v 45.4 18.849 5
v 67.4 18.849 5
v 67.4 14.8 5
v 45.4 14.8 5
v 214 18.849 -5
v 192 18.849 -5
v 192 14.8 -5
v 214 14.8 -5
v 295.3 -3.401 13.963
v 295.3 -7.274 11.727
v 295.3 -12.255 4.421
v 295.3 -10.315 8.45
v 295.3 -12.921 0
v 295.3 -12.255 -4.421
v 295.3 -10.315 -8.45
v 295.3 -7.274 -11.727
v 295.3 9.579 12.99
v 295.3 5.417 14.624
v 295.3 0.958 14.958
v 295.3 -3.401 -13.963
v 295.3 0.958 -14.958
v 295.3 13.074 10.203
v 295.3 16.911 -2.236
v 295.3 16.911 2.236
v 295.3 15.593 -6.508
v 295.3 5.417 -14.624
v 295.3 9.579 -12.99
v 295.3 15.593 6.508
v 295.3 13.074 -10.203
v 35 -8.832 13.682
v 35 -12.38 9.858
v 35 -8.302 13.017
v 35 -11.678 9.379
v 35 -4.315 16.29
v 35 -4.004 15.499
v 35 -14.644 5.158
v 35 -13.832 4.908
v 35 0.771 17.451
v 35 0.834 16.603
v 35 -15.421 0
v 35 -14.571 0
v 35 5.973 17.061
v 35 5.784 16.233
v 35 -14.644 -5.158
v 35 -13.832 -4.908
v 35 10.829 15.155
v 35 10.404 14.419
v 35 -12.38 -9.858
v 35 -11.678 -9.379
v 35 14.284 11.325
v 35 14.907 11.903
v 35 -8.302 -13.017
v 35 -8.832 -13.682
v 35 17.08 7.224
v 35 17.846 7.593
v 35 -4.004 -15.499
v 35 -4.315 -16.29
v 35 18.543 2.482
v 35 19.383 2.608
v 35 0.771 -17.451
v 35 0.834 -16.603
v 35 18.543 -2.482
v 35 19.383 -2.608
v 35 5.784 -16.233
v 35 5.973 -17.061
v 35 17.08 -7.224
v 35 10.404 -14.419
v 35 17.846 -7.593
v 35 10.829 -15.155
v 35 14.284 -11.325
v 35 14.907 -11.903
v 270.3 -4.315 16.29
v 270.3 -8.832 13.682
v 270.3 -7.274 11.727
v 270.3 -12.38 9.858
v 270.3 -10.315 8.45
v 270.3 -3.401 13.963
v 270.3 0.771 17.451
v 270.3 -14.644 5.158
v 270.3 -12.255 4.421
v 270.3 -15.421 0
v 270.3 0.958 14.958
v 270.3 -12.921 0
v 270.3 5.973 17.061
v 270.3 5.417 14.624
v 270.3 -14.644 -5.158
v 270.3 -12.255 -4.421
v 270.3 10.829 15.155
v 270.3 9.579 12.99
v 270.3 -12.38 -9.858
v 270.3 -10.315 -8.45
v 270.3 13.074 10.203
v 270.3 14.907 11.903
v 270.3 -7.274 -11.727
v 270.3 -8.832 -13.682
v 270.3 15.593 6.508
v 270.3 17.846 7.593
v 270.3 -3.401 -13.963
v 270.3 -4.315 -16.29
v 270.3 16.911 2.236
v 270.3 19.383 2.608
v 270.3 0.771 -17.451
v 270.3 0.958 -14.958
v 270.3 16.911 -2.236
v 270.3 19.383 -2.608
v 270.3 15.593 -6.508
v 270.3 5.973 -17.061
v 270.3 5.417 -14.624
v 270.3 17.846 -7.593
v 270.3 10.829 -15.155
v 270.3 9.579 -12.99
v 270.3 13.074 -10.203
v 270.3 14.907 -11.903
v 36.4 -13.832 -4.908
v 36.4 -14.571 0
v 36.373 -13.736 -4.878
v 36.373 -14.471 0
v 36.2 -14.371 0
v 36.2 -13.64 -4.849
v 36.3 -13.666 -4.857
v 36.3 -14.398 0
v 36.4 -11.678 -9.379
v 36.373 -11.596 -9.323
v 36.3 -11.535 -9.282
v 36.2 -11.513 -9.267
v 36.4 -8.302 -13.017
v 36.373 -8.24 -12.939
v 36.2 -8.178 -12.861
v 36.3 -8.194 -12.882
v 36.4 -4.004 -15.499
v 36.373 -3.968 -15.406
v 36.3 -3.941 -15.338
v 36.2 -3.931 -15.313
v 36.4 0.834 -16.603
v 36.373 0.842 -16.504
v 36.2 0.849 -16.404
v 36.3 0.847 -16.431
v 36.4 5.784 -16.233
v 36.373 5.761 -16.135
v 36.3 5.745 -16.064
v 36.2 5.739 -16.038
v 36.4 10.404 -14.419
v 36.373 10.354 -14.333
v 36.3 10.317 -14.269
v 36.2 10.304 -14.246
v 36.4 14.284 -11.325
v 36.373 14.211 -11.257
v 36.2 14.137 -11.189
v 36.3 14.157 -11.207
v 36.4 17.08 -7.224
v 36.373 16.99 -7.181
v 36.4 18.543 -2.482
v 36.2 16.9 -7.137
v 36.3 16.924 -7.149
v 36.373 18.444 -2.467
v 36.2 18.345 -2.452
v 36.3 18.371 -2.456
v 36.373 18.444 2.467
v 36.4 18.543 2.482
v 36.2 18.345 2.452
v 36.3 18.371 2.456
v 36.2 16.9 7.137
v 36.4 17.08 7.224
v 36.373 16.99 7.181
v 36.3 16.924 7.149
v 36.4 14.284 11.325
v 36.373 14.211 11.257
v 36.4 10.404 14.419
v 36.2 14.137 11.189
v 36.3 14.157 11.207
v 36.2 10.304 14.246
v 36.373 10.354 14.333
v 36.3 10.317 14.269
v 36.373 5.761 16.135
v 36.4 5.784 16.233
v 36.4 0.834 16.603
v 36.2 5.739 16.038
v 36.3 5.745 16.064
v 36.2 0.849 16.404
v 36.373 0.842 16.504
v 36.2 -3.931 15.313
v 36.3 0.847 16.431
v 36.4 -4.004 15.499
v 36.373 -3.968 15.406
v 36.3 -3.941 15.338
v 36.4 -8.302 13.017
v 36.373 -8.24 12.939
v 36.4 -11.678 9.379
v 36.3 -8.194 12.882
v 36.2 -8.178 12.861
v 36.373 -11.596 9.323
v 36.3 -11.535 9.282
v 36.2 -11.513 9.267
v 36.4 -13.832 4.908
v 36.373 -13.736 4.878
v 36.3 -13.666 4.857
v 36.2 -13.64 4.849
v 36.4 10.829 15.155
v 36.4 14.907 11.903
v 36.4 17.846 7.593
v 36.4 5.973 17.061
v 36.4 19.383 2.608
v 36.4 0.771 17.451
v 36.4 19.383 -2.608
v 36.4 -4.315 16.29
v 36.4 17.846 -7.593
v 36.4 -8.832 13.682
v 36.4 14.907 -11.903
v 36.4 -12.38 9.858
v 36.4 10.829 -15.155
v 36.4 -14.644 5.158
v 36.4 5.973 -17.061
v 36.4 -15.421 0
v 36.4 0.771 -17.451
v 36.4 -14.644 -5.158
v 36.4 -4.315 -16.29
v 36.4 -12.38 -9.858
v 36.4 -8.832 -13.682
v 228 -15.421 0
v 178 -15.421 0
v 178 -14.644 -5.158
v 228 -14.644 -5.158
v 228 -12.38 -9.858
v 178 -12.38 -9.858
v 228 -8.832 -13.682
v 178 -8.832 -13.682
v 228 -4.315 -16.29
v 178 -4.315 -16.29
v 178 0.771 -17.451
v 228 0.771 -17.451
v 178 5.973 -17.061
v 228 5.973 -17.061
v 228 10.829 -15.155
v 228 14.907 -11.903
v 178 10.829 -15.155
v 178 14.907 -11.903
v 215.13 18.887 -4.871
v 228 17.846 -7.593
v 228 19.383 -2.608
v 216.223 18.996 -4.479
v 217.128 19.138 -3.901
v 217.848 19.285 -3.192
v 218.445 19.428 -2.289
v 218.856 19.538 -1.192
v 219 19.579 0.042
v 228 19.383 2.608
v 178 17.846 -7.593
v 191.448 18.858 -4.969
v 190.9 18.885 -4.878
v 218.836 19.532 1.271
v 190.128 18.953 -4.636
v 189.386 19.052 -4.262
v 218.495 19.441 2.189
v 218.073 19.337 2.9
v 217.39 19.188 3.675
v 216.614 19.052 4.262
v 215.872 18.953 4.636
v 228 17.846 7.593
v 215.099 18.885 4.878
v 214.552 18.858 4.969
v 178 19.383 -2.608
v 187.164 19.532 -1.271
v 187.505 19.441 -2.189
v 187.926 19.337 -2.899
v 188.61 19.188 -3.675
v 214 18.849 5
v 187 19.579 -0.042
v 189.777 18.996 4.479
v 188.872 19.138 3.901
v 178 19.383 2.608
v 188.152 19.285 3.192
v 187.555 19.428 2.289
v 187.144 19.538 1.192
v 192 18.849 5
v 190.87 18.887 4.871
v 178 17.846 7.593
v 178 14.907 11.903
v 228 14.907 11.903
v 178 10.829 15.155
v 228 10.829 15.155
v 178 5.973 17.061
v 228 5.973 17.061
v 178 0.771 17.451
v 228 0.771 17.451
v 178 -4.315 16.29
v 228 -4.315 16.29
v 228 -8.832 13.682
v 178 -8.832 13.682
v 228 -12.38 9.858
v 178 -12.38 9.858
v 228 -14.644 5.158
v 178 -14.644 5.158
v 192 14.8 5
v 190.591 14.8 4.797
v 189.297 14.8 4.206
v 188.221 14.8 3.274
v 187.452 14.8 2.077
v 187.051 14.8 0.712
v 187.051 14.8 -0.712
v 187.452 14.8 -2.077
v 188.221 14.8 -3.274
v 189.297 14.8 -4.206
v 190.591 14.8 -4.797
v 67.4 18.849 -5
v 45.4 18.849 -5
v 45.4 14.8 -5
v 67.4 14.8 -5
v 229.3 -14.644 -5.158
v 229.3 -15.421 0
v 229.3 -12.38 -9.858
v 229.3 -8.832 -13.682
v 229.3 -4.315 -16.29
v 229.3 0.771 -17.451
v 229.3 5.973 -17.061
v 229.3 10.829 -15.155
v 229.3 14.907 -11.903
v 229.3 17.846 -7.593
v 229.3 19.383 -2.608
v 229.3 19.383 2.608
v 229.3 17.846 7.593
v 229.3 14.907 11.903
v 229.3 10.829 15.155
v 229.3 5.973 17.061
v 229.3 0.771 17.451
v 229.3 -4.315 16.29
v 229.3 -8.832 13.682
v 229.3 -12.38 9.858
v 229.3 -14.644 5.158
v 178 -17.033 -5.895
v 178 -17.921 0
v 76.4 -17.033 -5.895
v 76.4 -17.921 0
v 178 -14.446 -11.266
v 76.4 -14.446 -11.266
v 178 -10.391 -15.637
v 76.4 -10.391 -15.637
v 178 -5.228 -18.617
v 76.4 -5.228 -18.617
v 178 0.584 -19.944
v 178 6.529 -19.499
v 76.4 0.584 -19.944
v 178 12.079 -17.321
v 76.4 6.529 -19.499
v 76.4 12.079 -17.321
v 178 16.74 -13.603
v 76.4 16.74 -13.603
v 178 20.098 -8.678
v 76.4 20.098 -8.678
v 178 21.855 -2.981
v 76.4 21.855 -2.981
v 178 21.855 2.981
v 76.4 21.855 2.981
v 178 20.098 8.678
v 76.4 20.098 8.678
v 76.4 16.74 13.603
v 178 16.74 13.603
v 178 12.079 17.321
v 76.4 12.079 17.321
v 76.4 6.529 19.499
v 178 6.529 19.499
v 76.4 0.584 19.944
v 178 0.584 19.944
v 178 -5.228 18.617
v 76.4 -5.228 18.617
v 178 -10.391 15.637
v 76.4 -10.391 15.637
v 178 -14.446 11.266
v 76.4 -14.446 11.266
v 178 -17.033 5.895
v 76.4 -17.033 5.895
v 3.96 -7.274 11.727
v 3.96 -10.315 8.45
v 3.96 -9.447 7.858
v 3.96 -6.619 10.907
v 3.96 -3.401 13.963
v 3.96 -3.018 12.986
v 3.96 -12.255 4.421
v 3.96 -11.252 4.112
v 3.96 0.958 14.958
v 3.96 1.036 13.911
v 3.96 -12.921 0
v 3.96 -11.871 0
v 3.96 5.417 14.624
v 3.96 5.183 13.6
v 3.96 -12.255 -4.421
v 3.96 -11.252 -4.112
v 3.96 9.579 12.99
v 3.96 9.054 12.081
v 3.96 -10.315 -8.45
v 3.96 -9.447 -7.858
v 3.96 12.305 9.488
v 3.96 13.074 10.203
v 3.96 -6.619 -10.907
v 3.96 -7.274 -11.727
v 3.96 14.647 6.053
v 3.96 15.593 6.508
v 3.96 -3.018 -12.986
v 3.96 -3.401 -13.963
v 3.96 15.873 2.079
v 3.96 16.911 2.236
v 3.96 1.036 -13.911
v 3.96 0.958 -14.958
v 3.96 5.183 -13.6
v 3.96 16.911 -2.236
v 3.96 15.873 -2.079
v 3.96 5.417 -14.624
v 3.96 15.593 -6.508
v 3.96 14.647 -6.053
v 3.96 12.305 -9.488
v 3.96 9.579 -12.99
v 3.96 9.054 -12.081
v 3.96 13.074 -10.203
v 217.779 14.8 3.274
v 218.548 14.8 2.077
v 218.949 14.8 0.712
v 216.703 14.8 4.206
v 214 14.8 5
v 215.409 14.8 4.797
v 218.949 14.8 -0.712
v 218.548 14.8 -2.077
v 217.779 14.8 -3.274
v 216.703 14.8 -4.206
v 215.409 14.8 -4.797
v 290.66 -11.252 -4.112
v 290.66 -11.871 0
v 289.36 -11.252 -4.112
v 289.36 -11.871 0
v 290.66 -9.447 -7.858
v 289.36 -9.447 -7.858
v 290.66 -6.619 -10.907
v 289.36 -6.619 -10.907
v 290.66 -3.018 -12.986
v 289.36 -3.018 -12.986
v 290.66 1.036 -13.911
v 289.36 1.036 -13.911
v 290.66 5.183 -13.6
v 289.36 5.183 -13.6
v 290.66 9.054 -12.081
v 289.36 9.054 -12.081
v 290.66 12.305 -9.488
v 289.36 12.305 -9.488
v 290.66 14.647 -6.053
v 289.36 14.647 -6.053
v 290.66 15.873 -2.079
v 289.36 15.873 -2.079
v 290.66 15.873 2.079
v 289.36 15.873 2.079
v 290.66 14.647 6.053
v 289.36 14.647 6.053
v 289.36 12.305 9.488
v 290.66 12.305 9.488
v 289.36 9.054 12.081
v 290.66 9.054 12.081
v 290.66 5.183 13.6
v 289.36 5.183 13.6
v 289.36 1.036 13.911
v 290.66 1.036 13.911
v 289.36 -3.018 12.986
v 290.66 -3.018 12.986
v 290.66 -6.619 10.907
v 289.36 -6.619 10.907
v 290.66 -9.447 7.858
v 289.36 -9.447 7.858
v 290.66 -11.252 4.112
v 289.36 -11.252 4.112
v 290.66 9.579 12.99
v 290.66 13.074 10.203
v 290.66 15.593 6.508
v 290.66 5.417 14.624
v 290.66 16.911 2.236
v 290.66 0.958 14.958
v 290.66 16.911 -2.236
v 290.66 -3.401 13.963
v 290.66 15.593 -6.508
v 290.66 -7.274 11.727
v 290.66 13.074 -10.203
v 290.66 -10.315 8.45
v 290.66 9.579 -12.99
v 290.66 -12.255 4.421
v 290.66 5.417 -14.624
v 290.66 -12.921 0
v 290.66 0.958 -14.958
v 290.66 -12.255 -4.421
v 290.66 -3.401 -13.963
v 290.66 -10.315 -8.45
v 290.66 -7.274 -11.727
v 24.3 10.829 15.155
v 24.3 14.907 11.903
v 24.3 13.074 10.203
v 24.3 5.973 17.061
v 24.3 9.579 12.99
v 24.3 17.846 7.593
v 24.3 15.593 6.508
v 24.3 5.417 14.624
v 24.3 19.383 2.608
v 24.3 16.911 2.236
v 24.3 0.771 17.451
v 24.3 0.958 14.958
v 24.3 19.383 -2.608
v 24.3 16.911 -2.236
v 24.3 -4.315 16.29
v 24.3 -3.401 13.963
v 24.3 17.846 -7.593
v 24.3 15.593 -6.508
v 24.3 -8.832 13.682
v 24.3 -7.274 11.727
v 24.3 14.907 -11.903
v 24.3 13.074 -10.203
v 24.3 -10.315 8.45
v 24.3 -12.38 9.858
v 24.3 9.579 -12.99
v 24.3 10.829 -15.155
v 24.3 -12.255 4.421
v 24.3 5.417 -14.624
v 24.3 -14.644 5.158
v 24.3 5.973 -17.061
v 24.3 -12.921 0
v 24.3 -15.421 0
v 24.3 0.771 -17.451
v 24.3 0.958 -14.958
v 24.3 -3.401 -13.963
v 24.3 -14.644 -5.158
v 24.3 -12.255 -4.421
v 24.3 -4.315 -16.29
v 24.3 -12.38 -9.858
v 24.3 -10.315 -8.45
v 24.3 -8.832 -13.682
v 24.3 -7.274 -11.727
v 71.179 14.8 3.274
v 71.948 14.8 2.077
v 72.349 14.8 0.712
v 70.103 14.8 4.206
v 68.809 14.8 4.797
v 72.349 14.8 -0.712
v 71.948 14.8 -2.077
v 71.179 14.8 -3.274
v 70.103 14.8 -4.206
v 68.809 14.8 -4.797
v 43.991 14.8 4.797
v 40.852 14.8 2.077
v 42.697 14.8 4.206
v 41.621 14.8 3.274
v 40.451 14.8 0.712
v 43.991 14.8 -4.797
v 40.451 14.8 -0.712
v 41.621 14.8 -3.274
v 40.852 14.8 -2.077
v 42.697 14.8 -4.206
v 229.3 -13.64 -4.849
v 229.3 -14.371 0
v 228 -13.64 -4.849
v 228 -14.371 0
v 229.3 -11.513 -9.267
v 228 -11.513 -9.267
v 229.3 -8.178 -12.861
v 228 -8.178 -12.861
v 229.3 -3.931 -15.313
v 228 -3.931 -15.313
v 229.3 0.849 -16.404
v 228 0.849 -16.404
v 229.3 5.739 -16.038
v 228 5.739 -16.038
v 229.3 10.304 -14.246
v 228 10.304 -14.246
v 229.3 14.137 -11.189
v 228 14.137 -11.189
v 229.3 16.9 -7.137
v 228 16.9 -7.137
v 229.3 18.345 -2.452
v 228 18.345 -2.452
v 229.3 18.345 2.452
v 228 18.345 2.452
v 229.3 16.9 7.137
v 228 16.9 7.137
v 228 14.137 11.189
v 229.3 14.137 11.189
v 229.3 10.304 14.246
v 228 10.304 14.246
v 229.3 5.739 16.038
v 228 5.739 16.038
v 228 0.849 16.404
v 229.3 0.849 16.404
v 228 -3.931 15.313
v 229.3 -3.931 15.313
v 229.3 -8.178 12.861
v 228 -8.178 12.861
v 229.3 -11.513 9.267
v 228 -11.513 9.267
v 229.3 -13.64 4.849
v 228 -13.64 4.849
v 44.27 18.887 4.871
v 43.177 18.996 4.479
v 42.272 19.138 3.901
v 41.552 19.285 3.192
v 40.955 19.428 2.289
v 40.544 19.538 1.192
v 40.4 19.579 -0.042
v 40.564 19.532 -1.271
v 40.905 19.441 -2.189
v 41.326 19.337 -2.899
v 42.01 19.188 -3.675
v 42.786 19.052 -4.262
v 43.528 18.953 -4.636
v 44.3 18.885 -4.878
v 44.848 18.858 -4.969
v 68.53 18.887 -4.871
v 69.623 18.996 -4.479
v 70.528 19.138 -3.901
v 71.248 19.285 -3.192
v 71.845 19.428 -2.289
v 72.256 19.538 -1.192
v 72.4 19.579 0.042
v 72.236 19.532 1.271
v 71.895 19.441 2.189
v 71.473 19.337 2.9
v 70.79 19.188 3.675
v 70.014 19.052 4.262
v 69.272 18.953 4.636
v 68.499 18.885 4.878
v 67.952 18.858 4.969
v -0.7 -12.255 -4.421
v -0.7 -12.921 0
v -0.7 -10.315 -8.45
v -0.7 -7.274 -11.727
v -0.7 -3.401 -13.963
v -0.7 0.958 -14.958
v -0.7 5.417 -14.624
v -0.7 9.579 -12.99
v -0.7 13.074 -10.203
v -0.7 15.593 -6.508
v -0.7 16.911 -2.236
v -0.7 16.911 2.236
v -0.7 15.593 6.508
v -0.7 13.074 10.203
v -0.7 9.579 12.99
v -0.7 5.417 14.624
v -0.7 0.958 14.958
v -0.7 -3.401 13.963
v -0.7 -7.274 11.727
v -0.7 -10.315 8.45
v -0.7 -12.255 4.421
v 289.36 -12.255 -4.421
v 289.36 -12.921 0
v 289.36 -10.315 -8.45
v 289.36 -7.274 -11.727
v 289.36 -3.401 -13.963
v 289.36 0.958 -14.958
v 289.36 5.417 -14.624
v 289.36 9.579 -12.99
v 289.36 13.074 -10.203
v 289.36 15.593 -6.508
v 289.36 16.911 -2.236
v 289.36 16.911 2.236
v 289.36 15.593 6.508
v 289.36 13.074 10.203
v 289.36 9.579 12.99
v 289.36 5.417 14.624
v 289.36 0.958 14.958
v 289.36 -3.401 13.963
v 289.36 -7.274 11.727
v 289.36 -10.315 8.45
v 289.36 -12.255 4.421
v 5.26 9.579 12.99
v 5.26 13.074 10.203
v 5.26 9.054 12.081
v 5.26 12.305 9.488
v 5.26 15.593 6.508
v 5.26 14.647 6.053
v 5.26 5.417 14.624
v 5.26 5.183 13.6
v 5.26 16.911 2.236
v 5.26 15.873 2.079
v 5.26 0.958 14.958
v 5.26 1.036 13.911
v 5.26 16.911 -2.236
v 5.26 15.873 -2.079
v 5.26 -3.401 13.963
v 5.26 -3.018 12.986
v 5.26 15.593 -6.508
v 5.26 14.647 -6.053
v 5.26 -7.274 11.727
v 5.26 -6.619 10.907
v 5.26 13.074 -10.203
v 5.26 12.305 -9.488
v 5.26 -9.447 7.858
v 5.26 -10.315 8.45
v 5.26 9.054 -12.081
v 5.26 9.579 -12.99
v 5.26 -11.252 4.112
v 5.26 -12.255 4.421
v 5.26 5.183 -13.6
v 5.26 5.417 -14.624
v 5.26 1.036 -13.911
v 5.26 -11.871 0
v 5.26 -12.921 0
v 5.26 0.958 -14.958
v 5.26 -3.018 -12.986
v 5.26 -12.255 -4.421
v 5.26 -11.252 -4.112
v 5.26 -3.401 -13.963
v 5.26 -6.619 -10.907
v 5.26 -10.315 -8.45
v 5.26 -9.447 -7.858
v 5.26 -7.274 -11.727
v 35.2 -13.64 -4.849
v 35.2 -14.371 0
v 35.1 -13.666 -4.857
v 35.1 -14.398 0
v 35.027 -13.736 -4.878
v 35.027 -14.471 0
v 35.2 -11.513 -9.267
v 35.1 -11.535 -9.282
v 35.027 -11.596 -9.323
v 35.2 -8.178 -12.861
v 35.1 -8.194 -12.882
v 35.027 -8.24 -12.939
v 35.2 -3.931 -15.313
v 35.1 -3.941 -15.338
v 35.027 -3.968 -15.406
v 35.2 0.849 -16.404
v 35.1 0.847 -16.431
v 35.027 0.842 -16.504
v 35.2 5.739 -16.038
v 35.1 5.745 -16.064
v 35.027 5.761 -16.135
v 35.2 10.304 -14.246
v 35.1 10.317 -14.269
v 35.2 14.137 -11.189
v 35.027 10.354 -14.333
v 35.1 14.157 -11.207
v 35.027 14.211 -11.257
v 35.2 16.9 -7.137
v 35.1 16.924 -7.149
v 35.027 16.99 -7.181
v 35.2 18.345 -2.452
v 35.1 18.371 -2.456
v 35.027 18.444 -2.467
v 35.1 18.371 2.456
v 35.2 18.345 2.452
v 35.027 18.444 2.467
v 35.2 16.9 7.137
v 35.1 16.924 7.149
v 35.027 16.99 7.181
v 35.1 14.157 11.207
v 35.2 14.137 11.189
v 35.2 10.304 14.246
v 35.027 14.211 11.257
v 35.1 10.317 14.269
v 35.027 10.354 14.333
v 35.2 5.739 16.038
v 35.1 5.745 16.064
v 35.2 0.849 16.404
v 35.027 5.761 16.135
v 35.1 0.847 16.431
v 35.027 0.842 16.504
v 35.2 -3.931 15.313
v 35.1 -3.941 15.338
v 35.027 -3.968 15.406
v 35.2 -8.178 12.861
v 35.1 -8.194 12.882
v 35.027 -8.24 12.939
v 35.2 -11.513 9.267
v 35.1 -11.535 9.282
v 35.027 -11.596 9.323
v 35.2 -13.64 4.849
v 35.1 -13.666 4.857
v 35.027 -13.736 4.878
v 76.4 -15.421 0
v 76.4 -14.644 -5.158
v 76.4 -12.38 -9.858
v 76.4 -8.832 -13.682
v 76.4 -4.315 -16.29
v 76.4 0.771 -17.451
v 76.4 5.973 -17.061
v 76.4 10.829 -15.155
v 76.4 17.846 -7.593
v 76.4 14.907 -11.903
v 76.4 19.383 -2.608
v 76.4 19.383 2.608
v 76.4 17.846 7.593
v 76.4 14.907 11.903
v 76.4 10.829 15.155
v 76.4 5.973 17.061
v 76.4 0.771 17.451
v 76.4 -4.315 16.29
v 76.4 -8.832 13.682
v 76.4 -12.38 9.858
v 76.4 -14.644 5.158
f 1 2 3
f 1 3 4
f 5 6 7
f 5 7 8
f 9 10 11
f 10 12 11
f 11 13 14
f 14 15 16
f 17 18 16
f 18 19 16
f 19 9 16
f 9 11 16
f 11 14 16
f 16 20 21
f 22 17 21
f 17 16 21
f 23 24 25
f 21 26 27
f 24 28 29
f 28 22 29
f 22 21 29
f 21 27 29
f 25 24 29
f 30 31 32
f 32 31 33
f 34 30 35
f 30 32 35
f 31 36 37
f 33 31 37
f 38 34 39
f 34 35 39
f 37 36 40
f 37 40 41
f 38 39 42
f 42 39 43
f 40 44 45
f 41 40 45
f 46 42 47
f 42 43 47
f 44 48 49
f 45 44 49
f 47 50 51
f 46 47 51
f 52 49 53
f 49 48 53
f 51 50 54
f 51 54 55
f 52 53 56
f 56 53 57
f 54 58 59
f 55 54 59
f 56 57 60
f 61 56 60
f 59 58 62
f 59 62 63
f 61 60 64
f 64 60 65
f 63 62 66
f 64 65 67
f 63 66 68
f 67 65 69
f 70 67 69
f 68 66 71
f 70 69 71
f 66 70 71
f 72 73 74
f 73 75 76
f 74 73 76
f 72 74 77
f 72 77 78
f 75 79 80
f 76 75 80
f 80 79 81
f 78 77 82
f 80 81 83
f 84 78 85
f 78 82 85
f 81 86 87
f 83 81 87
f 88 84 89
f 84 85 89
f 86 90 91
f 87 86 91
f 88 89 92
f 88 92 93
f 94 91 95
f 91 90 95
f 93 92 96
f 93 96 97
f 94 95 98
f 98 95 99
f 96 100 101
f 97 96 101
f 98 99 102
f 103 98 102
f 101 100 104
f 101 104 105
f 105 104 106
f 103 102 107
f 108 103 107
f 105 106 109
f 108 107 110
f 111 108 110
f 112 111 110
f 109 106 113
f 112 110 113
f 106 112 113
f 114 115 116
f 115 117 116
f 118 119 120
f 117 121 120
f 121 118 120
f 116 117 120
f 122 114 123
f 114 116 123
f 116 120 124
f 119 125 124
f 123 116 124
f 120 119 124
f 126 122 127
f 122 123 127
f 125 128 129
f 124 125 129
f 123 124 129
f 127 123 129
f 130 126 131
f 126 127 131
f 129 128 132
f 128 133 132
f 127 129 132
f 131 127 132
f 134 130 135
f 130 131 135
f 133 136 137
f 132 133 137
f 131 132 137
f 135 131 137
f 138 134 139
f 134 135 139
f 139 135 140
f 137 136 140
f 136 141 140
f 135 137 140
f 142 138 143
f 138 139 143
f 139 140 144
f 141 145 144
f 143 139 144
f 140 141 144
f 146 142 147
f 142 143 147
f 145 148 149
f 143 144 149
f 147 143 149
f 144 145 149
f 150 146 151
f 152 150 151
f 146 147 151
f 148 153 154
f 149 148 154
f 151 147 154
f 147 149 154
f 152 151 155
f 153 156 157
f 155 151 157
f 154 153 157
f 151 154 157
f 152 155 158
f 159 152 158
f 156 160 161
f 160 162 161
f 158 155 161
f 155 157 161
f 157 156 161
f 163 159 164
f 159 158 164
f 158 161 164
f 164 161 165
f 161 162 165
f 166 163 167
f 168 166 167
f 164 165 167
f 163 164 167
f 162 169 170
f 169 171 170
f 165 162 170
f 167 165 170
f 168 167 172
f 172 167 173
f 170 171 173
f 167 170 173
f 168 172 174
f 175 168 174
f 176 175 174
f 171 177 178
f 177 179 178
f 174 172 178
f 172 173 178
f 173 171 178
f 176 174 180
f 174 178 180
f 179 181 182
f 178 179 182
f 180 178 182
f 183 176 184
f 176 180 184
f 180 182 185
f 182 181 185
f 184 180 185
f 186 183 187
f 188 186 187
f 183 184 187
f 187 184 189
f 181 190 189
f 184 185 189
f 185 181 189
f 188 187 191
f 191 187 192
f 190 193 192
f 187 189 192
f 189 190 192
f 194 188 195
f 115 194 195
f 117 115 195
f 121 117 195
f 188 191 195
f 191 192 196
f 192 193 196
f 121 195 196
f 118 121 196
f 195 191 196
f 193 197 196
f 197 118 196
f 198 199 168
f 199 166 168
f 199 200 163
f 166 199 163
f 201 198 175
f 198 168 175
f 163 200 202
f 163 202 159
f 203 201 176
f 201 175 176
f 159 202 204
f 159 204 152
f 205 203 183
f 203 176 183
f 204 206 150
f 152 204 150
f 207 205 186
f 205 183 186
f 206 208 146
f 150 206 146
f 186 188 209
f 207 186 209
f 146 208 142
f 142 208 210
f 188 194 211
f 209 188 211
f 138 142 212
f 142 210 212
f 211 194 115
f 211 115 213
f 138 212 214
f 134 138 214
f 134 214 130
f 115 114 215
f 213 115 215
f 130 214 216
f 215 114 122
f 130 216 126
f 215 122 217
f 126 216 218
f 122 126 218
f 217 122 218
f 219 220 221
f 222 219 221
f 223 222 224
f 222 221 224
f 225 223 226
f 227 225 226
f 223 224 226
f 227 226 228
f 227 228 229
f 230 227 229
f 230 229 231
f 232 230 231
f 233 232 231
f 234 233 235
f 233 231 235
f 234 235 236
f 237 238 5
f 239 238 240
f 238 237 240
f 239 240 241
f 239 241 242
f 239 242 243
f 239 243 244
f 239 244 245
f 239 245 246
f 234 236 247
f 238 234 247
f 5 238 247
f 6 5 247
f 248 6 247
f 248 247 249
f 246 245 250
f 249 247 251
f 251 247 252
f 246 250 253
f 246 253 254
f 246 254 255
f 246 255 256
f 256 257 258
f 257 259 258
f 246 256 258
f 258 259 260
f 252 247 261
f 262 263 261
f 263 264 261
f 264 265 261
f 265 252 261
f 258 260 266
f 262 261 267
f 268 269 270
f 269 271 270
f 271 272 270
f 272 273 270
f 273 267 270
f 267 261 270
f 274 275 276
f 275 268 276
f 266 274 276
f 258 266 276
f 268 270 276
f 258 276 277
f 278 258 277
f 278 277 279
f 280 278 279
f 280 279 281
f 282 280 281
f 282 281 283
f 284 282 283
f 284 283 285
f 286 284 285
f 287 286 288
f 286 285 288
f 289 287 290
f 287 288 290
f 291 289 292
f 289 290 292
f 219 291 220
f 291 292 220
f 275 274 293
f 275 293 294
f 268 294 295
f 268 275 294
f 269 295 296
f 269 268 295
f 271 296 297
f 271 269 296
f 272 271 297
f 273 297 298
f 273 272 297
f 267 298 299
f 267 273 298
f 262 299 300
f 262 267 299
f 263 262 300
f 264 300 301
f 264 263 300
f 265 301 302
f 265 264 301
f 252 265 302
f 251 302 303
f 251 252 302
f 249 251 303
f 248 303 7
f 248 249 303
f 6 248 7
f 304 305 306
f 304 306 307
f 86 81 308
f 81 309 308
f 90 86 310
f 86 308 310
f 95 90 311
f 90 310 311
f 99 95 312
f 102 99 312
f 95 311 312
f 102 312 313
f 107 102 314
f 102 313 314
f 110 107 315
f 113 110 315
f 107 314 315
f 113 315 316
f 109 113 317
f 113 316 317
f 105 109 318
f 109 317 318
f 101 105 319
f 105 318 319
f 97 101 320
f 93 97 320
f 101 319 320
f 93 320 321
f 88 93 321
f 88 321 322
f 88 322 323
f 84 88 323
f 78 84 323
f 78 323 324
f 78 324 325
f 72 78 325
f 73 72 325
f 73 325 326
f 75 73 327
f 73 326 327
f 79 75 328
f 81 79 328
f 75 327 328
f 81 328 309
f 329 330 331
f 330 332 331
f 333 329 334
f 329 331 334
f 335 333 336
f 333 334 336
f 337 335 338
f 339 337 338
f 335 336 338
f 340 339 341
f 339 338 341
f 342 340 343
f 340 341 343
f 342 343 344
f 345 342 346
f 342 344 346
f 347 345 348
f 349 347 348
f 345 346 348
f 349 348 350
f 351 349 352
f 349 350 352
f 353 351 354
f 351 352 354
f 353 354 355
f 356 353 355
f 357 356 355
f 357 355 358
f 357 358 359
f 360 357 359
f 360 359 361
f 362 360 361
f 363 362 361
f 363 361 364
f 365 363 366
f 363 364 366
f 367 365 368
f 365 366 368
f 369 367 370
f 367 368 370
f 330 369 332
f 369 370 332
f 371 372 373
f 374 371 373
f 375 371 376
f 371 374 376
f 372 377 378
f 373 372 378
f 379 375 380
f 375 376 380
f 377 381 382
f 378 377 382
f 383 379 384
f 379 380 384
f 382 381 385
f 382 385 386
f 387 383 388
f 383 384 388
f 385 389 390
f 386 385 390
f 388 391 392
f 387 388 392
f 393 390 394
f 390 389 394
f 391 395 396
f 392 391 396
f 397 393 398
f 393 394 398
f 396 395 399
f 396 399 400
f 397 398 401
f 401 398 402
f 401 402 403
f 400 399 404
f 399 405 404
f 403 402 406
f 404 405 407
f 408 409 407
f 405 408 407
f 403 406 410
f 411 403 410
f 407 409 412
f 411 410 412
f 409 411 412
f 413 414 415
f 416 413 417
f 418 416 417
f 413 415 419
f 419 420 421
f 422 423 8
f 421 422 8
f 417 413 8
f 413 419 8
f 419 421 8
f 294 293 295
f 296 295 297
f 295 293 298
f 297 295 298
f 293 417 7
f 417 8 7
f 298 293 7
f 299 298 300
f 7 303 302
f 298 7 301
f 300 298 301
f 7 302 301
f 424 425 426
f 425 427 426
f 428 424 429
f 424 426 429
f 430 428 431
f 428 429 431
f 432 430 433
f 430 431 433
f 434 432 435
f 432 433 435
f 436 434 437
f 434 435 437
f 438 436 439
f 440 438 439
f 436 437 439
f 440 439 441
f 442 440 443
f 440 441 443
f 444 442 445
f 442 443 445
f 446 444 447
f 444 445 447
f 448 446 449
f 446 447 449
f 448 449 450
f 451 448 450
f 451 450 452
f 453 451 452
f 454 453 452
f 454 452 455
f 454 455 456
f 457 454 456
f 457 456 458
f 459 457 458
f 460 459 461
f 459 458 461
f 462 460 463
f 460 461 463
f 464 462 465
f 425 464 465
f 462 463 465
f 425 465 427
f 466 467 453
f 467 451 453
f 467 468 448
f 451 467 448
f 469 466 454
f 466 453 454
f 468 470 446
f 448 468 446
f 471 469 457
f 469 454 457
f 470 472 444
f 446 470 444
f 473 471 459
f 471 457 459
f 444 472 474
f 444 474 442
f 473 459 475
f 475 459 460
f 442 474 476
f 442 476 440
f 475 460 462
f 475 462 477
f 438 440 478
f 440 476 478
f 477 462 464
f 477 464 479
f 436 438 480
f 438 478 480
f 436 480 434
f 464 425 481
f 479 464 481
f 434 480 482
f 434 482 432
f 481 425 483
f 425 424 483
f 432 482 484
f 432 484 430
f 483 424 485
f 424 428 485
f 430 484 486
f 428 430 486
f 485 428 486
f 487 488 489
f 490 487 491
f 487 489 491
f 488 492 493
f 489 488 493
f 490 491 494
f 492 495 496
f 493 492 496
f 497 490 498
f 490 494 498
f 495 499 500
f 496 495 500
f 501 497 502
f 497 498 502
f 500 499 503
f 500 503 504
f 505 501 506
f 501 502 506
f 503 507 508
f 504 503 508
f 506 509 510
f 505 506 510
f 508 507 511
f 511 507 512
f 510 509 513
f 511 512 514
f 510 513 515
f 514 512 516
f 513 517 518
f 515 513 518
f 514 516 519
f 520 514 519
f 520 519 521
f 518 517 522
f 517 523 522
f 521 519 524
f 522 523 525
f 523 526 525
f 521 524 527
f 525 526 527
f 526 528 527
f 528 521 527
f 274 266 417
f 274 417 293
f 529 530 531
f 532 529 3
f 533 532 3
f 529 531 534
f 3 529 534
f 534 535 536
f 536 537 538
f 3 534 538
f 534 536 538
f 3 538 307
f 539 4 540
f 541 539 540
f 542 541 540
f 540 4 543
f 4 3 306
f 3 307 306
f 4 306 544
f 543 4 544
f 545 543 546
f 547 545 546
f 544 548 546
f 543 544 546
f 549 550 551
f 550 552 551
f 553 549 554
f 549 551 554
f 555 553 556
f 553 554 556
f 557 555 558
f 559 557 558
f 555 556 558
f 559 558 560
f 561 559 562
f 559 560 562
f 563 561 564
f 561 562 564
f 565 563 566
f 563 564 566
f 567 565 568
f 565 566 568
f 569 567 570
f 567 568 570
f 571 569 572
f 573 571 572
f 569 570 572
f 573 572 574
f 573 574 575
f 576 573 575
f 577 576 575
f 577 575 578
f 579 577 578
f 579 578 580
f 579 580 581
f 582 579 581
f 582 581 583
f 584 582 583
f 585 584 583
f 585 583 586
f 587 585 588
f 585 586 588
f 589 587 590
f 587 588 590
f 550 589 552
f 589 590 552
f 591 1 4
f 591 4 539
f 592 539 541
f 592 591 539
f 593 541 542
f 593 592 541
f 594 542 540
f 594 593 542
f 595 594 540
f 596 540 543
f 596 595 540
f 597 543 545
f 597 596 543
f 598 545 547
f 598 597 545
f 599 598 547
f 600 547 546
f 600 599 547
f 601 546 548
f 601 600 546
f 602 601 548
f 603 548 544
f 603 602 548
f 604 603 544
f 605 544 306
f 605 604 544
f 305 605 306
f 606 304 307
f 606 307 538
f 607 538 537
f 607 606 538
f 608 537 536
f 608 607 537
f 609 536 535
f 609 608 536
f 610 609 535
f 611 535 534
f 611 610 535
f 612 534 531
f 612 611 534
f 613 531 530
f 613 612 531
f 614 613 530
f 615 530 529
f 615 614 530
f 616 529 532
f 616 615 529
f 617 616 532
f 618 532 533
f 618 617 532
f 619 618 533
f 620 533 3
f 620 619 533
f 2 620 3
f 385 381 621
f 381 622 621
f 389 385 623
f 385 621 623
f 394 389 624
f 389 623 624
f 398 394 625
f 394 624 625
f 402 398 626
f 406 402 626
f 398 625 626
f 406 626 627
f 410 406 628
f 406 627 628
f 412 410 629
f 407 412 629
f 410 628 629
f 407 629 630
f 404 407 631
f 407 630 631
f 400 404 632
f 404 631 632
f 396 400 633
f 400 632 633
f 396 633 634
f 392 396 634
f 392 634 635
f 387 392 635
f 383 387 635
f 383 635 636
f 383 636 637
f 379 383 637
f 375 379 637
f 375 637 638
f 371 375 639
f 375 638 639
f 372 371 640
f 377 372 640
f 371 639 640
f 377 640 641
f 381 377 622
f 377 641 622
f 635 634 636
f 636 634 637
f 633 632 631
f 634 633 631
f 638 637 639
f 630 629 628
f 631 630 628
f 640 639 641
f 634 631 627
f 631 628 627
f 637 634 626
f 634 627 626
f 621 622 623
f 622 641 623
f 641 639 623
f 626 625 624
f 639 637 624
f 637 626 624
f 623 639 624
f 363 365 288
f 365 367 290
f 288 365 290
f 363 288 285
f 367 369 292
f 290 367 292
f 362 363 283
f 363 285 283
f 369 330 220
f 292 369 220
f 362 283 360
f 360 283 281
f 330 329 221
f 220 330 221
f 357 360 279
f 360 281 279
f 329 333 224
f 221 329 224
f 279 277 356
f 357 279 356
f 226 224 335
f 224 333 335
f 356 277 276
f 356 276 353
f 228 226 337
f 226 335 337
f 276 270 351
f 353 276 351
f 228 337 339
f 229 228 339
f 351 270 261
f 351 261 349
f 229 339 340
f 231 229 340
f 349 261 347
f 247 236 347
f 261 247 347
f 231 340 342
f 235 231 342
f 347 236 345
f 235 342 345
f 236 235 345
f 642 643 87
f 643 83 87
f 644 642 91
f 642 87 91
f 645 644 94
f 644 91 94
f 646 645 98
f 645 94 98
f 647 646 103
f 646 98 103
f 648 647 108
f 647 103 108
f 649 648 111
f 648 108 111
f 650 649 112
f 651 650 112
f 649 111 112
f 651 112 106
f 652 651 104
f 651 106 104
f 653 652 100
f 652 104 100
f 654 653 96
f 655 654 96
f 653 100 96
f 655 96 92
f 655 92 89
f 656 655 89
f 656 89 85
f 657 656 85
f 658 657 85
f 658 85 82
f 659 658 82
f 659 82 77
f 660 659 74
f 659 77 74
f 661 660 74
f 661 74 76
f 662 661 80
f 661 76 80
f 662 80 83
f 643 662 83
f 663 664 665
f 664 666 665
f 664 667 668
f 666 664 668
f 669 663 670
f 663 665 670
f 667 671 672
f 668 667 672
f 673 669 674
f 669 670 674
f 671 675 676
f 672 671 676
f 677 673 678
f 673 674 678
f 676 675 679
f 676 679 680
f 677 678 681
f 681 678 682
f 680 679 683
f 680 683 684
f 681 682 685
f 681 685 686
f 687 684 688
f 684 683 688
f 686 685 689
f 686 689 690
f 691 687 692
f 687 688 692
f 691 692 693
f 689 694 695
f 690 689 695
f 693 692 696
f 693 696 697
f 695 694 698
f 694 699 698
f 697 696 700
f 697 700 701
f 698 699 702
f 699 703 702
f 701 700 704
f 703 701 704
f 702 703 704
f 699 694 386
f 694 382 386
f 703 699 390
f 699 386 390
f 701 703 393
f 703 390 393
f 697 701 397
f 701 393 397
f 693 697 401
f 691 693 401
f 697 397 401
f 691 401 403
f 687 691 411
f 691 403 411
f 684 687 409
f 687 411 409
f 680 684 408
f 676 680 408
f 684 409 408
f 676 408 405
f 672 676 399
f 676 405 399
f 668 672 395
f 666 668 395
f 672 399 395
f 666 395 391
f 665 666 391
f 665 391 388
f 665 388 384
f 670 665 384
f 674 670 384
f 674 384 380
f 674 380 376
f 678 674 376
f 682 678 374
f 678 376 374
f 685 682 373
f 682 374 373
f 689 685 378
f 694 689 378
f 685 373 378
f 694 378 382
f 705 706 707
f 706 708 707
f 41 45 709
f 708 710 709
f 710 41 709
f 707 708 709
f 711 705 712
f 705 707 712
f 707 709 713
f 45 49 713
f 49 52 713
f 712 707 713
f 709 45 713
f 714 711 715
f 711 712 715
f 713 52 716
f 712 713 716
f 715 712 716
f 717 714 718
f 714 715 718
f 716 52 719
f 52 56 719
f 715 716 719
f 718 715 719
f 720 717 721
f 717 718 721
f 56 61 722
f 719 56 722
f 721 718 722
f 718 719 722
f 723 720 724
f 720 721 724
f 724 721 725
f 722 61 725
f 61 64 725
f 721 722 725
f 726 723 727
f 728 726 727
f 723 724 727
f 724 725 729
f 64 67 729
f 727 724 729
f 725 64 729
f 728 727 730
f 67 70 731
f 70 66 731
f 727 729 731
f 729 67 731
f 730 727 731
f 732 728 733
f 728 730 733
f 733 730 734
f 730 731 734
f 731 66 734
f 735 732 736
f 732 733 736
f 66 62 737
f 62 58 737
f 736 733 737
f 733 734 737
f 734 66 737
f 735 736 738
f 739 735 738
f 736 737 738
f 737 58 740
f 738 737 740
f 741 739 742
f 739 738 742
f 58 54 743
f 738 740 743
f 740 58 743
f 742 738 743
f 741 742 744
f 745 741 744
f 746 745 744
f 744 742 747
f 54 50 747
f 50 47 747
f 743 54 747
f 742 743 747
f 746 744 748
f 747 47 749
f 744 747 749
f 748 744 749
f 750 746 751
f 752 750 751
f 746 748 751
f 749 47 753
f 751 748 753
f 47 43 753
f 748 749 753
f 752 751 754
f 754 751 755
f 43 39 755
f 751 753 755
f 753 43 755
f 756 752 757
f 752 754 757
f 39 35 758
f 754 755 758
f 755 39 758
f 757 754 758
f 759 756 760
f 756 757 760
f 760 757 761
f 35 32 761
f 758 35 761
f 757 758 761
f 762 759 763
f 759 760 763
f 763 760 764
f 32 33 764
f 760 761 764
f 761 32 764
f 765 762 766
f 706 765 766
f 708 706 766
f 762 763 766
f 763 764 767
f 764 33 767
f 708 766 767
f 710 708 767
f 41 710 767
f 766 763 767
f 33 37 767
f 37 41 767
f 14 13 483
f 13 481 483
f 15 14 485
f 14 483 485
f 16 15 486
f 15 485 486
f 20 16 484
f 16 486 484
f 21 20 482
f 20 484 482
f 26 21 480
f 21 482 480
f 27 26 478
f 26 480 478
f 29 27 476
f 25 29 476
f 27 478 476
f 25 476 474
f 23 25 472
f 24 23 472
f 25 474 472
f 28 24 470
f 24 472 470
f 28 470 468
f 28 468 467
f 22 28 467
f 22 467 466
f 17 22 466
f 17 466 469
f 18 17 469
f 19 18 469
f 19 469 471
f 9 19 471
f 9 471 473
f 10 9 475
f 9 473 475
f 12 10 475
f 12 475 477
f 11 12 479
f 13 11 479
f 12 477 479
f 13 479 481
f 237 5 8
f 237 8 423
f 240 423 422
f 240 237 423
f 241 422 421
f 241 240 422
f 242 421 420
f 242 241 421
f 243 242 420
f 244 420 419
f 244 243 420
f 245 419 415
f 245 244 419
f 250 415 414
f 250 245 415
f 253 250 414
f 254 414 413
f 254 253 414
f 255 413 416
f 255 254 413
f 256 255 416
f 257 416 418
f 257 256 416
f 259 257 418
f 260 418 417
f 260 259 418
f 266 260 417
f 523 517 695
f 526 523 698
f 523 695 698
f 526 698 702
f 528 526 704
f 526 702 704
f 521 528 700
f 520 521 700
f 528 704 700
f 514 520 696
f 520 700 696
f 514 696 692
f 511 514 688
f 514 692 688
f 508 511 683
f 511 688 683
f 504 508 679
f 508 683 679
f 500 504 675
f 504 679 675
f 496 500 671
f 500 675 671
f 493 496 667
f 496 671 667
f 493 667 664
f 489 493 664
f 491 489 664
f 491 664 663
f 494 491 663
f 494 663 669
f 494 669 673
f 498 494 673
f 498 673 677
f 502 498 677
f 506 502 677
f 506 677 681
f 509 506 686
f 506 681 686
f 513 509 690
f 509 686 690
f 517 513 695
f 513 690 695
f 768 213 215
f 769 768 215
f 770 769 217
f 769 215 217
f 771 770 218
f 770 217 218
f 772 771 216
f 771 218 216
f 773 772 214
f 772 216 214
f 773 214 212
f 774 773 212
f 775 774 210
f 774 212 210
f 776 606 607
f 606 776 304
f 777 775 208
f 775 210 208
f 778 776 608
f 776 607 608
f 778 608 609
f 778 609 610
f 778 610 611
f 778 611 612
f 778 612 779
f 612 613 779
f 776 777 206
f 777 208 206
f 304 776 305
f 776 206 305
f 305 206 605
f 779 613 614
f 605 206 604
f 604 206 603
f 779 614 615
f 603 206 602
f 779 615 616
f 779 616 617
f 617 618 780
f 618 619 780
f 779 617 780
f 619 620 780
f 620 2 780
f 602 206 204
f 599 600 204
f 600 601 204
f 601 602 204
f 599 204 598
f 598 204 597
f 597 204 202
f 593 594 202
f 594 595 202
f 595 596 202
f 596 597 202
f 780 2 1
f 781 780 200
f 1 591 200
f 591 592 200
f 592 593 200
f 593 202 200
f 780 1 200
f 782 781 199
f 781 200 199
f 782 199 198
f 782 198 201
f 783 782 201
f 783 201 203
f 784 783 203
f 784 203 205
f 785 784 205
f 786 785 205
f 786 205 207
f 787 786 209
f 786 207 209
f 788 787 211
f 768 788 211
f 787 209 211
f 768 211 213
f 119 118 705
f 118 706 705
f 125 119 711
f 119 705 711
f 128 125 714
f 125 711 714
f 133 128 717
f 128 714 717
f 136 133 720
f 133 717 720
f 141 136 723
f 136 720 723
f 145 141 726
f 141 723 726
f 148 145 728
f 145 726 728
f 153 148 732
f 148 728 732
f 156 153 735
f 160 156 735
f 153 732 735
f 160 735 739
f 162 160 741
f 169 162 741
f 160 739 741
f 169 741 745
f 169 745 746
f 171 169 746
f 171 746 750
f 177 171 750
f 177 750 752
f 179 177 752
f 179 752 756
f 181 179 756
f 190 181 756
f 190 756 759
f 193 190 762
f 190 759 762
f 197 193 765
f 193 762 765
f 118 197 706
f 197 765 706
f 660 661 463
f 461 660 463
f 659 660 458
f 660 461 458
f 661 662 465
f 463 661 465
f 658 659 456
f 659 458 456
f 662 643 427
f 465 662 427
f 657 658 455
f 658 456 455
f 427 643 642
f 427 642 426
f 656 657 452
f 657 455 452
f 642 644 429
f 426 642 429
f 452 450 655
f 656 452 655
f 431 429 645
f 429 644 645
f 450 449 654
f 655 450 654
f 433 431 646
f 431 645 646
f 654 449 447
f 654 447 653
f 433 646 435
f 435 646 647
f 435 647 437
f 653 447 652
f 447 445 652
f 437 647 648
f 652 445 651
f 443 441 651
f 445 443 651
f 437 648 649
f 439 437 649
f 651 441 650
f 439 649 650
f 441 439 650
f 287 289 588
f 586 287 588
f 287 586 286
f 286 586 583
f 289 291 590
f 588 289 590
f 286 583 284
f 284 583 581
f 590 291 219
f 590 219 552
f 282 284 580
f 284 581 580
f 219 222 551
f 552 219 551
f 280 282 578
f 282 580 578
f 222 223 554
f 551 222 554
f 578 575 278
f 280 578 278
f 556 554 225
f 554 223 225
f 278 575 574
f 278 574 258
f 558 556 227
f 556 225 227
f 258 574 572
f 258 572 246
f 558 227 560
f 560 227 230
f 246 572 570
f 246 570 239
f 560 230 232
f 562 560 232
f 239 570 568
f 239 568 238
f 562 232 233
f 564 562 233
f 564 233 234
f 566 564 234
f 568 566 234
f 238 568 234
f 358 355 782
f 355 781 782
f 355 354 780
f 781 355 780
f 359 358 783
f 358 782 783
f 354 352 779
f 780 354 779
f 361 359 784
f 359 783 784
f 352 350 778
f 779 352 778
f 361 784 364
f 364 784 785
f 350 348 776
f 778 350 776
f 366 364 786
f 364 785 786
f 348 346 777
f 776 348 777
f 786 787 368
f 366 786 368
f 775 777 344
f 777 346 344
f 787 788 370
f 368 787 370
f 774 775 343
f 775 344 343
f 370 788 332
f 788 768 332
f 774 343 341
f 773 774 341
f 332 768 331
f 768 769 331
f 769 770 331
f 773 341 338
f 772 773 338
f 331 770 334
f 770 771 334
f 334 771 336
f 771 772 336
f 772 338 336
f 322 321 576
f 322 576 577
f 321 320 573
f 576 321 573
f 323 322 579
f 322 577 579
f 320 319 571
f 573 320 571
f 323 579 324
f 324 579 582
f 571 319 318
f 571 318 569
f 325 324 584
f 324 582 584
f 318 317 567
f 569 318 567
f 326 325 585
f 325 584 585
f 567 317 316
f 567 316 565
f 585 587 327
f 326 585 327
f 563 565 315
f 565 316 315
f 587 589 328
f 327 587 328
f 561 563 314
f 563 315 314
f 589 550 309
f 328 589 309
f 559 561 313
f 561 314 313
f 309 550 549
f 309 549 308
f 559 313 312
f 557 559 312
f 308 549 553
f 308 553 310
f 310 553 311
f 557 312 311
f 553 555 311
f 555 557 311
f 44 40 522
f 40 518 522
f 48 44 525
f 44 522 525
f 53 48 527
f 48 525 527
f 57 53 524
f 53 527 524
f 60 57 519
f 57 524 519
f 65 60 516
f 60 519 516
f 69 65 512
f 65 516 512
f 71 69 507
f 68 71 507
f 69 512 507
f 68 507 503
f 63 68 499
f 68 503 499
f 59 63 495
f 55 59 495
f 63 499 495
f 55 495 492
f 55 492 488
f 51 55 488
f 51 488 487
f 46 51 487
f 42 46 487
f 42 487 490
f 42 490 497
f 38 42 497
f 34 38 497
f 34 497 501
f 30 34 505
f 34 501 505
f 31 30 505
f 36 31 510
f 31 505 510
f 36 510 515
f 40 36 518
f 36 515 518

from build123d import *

# Parameters (mm, degrees)
CUT_EXTRUDE3_START = 21
CUT_EXTRUDE3_DEPTH = 6.2


with BuildPart() as part:
    # Sketch1 → Revolve1 (revolve)
    with BuildSketch(Plane.XY, mode=Mode.PRIVATE) as revolve1_sk:
        with BuildLine():
            Line((24.3, 17.078694854), (5.260372827, 17.078694854))
            Line((5.260372827, 17.078694854), (5.260372827, 16.028694854))
            Line((5.260372827, 16.028694854), (3.960372827, 16.028694854))
            Line((3.960372827, 16.028694854), (3.960372827, 17.078694854))
            Line((3.960372827, 17.078694854), (-0.7, 17.078694854))
            Line((-0.7, 17.078694854), (-0.7, 2.078694854))
            Line((-0.7, 2.078694854), (295.3, 2.078694854))
            Line((295.3, 2.078694854), (295.3, 17.078694854))
            Line((295.3, 17.078694854), (290.659722162, 17.078694854))
            Line((290.659722162, 17.078694854), (290.659722162, 16.028694854))
            Line((290.659722162, 16.028694854), (289.359722162, 16.028694854))
            Line((289.359722162, 16.028694854), (289.359722162, 17.078694854))
            Line((289.359722162, 17.078694854), (270.3, 17.078694854))
            Line((270.3, 17.078694854), (270.3, 19.578694854))
            Line((270.3, 19.578694854), (229.3, 19.578694854))
            Line((229.3, 19.578694854), (229.3, 18.528694854))
            Line((229.3, 18.528694854), (228, 18.528694854))
            Line((228, 18.528694854), (228, 19.578694854))
            Line((228, 19.578694854), (178, 19.578694854))
            Line((178, 19.578694854), (178, 22.078694854))
            Line((178, 22.078694854), (76.4, 22.078694854))
            Line((76.4, 22.078694854), (76.4, 19.578694854))
            Line((76.4, 19.578694854), (36.4, 19.578694854))
            Line((36.4, 19.578694854), (36.4, 18.728694854))
            ThreePointArc((36.4, 18.728694854), (36.341421356, 18.587273498), (36.2, 18.528694854))
            Line((36.2, 18.528694854), (35.2, 18.528694854))
            ThreePointArc((35.2, 18.528694854), (35.058578644, 18.587273498), (35, 18.728694854))
            Line((35, 18.728694854), (35, 19.578694854))
            Line((35, 19.578694854), (24.3, 19.578694854))
            Line((24.3, 19.578694854), (24.3, 17.078694854))
        make_face()
    revolve(revolve1_sk.sketch.rotate(Axis((-34.240282719, 2.078694854, 0), (1, 0, 0)), 180), axis=Axis((-34.240282719, 2.078694854, 0), (1, 0, 0)))

    # Sketch4 → Cut-Extrude3 (cut)
    with BuildSketch(Plane(origin=(0, 0, 0), x_dir=(1, 0, 0), z_dir=(0, 1, 0)).offset(CUT_EXTRUDE3_START)):
        with BuildLine():
            Line((45.4, 5), (67.4, 5))
            ThreePointArc((67.4, 5), (72.4, 0), (67.4, -5))
            Line((67.4, -5), (45.4, -5))
            ThreePointArc((45.4, -5), (40.4, 0), (45.4, 5))
        make_face()
        with BuildLine():
            Line((192, 5), (214, 5))
            ThreePointArc((214, 5), (219, 0), (214, -5))
            Line((214, -5), (192, -5))
            ThreePointArc((192, -5), (187, 0), (192, 5))
        make_face()
    extrude(amount=-CUT_EXTRUDE3_DEPTH, mode=Mode.SUBTRACT)


solid = part.part
